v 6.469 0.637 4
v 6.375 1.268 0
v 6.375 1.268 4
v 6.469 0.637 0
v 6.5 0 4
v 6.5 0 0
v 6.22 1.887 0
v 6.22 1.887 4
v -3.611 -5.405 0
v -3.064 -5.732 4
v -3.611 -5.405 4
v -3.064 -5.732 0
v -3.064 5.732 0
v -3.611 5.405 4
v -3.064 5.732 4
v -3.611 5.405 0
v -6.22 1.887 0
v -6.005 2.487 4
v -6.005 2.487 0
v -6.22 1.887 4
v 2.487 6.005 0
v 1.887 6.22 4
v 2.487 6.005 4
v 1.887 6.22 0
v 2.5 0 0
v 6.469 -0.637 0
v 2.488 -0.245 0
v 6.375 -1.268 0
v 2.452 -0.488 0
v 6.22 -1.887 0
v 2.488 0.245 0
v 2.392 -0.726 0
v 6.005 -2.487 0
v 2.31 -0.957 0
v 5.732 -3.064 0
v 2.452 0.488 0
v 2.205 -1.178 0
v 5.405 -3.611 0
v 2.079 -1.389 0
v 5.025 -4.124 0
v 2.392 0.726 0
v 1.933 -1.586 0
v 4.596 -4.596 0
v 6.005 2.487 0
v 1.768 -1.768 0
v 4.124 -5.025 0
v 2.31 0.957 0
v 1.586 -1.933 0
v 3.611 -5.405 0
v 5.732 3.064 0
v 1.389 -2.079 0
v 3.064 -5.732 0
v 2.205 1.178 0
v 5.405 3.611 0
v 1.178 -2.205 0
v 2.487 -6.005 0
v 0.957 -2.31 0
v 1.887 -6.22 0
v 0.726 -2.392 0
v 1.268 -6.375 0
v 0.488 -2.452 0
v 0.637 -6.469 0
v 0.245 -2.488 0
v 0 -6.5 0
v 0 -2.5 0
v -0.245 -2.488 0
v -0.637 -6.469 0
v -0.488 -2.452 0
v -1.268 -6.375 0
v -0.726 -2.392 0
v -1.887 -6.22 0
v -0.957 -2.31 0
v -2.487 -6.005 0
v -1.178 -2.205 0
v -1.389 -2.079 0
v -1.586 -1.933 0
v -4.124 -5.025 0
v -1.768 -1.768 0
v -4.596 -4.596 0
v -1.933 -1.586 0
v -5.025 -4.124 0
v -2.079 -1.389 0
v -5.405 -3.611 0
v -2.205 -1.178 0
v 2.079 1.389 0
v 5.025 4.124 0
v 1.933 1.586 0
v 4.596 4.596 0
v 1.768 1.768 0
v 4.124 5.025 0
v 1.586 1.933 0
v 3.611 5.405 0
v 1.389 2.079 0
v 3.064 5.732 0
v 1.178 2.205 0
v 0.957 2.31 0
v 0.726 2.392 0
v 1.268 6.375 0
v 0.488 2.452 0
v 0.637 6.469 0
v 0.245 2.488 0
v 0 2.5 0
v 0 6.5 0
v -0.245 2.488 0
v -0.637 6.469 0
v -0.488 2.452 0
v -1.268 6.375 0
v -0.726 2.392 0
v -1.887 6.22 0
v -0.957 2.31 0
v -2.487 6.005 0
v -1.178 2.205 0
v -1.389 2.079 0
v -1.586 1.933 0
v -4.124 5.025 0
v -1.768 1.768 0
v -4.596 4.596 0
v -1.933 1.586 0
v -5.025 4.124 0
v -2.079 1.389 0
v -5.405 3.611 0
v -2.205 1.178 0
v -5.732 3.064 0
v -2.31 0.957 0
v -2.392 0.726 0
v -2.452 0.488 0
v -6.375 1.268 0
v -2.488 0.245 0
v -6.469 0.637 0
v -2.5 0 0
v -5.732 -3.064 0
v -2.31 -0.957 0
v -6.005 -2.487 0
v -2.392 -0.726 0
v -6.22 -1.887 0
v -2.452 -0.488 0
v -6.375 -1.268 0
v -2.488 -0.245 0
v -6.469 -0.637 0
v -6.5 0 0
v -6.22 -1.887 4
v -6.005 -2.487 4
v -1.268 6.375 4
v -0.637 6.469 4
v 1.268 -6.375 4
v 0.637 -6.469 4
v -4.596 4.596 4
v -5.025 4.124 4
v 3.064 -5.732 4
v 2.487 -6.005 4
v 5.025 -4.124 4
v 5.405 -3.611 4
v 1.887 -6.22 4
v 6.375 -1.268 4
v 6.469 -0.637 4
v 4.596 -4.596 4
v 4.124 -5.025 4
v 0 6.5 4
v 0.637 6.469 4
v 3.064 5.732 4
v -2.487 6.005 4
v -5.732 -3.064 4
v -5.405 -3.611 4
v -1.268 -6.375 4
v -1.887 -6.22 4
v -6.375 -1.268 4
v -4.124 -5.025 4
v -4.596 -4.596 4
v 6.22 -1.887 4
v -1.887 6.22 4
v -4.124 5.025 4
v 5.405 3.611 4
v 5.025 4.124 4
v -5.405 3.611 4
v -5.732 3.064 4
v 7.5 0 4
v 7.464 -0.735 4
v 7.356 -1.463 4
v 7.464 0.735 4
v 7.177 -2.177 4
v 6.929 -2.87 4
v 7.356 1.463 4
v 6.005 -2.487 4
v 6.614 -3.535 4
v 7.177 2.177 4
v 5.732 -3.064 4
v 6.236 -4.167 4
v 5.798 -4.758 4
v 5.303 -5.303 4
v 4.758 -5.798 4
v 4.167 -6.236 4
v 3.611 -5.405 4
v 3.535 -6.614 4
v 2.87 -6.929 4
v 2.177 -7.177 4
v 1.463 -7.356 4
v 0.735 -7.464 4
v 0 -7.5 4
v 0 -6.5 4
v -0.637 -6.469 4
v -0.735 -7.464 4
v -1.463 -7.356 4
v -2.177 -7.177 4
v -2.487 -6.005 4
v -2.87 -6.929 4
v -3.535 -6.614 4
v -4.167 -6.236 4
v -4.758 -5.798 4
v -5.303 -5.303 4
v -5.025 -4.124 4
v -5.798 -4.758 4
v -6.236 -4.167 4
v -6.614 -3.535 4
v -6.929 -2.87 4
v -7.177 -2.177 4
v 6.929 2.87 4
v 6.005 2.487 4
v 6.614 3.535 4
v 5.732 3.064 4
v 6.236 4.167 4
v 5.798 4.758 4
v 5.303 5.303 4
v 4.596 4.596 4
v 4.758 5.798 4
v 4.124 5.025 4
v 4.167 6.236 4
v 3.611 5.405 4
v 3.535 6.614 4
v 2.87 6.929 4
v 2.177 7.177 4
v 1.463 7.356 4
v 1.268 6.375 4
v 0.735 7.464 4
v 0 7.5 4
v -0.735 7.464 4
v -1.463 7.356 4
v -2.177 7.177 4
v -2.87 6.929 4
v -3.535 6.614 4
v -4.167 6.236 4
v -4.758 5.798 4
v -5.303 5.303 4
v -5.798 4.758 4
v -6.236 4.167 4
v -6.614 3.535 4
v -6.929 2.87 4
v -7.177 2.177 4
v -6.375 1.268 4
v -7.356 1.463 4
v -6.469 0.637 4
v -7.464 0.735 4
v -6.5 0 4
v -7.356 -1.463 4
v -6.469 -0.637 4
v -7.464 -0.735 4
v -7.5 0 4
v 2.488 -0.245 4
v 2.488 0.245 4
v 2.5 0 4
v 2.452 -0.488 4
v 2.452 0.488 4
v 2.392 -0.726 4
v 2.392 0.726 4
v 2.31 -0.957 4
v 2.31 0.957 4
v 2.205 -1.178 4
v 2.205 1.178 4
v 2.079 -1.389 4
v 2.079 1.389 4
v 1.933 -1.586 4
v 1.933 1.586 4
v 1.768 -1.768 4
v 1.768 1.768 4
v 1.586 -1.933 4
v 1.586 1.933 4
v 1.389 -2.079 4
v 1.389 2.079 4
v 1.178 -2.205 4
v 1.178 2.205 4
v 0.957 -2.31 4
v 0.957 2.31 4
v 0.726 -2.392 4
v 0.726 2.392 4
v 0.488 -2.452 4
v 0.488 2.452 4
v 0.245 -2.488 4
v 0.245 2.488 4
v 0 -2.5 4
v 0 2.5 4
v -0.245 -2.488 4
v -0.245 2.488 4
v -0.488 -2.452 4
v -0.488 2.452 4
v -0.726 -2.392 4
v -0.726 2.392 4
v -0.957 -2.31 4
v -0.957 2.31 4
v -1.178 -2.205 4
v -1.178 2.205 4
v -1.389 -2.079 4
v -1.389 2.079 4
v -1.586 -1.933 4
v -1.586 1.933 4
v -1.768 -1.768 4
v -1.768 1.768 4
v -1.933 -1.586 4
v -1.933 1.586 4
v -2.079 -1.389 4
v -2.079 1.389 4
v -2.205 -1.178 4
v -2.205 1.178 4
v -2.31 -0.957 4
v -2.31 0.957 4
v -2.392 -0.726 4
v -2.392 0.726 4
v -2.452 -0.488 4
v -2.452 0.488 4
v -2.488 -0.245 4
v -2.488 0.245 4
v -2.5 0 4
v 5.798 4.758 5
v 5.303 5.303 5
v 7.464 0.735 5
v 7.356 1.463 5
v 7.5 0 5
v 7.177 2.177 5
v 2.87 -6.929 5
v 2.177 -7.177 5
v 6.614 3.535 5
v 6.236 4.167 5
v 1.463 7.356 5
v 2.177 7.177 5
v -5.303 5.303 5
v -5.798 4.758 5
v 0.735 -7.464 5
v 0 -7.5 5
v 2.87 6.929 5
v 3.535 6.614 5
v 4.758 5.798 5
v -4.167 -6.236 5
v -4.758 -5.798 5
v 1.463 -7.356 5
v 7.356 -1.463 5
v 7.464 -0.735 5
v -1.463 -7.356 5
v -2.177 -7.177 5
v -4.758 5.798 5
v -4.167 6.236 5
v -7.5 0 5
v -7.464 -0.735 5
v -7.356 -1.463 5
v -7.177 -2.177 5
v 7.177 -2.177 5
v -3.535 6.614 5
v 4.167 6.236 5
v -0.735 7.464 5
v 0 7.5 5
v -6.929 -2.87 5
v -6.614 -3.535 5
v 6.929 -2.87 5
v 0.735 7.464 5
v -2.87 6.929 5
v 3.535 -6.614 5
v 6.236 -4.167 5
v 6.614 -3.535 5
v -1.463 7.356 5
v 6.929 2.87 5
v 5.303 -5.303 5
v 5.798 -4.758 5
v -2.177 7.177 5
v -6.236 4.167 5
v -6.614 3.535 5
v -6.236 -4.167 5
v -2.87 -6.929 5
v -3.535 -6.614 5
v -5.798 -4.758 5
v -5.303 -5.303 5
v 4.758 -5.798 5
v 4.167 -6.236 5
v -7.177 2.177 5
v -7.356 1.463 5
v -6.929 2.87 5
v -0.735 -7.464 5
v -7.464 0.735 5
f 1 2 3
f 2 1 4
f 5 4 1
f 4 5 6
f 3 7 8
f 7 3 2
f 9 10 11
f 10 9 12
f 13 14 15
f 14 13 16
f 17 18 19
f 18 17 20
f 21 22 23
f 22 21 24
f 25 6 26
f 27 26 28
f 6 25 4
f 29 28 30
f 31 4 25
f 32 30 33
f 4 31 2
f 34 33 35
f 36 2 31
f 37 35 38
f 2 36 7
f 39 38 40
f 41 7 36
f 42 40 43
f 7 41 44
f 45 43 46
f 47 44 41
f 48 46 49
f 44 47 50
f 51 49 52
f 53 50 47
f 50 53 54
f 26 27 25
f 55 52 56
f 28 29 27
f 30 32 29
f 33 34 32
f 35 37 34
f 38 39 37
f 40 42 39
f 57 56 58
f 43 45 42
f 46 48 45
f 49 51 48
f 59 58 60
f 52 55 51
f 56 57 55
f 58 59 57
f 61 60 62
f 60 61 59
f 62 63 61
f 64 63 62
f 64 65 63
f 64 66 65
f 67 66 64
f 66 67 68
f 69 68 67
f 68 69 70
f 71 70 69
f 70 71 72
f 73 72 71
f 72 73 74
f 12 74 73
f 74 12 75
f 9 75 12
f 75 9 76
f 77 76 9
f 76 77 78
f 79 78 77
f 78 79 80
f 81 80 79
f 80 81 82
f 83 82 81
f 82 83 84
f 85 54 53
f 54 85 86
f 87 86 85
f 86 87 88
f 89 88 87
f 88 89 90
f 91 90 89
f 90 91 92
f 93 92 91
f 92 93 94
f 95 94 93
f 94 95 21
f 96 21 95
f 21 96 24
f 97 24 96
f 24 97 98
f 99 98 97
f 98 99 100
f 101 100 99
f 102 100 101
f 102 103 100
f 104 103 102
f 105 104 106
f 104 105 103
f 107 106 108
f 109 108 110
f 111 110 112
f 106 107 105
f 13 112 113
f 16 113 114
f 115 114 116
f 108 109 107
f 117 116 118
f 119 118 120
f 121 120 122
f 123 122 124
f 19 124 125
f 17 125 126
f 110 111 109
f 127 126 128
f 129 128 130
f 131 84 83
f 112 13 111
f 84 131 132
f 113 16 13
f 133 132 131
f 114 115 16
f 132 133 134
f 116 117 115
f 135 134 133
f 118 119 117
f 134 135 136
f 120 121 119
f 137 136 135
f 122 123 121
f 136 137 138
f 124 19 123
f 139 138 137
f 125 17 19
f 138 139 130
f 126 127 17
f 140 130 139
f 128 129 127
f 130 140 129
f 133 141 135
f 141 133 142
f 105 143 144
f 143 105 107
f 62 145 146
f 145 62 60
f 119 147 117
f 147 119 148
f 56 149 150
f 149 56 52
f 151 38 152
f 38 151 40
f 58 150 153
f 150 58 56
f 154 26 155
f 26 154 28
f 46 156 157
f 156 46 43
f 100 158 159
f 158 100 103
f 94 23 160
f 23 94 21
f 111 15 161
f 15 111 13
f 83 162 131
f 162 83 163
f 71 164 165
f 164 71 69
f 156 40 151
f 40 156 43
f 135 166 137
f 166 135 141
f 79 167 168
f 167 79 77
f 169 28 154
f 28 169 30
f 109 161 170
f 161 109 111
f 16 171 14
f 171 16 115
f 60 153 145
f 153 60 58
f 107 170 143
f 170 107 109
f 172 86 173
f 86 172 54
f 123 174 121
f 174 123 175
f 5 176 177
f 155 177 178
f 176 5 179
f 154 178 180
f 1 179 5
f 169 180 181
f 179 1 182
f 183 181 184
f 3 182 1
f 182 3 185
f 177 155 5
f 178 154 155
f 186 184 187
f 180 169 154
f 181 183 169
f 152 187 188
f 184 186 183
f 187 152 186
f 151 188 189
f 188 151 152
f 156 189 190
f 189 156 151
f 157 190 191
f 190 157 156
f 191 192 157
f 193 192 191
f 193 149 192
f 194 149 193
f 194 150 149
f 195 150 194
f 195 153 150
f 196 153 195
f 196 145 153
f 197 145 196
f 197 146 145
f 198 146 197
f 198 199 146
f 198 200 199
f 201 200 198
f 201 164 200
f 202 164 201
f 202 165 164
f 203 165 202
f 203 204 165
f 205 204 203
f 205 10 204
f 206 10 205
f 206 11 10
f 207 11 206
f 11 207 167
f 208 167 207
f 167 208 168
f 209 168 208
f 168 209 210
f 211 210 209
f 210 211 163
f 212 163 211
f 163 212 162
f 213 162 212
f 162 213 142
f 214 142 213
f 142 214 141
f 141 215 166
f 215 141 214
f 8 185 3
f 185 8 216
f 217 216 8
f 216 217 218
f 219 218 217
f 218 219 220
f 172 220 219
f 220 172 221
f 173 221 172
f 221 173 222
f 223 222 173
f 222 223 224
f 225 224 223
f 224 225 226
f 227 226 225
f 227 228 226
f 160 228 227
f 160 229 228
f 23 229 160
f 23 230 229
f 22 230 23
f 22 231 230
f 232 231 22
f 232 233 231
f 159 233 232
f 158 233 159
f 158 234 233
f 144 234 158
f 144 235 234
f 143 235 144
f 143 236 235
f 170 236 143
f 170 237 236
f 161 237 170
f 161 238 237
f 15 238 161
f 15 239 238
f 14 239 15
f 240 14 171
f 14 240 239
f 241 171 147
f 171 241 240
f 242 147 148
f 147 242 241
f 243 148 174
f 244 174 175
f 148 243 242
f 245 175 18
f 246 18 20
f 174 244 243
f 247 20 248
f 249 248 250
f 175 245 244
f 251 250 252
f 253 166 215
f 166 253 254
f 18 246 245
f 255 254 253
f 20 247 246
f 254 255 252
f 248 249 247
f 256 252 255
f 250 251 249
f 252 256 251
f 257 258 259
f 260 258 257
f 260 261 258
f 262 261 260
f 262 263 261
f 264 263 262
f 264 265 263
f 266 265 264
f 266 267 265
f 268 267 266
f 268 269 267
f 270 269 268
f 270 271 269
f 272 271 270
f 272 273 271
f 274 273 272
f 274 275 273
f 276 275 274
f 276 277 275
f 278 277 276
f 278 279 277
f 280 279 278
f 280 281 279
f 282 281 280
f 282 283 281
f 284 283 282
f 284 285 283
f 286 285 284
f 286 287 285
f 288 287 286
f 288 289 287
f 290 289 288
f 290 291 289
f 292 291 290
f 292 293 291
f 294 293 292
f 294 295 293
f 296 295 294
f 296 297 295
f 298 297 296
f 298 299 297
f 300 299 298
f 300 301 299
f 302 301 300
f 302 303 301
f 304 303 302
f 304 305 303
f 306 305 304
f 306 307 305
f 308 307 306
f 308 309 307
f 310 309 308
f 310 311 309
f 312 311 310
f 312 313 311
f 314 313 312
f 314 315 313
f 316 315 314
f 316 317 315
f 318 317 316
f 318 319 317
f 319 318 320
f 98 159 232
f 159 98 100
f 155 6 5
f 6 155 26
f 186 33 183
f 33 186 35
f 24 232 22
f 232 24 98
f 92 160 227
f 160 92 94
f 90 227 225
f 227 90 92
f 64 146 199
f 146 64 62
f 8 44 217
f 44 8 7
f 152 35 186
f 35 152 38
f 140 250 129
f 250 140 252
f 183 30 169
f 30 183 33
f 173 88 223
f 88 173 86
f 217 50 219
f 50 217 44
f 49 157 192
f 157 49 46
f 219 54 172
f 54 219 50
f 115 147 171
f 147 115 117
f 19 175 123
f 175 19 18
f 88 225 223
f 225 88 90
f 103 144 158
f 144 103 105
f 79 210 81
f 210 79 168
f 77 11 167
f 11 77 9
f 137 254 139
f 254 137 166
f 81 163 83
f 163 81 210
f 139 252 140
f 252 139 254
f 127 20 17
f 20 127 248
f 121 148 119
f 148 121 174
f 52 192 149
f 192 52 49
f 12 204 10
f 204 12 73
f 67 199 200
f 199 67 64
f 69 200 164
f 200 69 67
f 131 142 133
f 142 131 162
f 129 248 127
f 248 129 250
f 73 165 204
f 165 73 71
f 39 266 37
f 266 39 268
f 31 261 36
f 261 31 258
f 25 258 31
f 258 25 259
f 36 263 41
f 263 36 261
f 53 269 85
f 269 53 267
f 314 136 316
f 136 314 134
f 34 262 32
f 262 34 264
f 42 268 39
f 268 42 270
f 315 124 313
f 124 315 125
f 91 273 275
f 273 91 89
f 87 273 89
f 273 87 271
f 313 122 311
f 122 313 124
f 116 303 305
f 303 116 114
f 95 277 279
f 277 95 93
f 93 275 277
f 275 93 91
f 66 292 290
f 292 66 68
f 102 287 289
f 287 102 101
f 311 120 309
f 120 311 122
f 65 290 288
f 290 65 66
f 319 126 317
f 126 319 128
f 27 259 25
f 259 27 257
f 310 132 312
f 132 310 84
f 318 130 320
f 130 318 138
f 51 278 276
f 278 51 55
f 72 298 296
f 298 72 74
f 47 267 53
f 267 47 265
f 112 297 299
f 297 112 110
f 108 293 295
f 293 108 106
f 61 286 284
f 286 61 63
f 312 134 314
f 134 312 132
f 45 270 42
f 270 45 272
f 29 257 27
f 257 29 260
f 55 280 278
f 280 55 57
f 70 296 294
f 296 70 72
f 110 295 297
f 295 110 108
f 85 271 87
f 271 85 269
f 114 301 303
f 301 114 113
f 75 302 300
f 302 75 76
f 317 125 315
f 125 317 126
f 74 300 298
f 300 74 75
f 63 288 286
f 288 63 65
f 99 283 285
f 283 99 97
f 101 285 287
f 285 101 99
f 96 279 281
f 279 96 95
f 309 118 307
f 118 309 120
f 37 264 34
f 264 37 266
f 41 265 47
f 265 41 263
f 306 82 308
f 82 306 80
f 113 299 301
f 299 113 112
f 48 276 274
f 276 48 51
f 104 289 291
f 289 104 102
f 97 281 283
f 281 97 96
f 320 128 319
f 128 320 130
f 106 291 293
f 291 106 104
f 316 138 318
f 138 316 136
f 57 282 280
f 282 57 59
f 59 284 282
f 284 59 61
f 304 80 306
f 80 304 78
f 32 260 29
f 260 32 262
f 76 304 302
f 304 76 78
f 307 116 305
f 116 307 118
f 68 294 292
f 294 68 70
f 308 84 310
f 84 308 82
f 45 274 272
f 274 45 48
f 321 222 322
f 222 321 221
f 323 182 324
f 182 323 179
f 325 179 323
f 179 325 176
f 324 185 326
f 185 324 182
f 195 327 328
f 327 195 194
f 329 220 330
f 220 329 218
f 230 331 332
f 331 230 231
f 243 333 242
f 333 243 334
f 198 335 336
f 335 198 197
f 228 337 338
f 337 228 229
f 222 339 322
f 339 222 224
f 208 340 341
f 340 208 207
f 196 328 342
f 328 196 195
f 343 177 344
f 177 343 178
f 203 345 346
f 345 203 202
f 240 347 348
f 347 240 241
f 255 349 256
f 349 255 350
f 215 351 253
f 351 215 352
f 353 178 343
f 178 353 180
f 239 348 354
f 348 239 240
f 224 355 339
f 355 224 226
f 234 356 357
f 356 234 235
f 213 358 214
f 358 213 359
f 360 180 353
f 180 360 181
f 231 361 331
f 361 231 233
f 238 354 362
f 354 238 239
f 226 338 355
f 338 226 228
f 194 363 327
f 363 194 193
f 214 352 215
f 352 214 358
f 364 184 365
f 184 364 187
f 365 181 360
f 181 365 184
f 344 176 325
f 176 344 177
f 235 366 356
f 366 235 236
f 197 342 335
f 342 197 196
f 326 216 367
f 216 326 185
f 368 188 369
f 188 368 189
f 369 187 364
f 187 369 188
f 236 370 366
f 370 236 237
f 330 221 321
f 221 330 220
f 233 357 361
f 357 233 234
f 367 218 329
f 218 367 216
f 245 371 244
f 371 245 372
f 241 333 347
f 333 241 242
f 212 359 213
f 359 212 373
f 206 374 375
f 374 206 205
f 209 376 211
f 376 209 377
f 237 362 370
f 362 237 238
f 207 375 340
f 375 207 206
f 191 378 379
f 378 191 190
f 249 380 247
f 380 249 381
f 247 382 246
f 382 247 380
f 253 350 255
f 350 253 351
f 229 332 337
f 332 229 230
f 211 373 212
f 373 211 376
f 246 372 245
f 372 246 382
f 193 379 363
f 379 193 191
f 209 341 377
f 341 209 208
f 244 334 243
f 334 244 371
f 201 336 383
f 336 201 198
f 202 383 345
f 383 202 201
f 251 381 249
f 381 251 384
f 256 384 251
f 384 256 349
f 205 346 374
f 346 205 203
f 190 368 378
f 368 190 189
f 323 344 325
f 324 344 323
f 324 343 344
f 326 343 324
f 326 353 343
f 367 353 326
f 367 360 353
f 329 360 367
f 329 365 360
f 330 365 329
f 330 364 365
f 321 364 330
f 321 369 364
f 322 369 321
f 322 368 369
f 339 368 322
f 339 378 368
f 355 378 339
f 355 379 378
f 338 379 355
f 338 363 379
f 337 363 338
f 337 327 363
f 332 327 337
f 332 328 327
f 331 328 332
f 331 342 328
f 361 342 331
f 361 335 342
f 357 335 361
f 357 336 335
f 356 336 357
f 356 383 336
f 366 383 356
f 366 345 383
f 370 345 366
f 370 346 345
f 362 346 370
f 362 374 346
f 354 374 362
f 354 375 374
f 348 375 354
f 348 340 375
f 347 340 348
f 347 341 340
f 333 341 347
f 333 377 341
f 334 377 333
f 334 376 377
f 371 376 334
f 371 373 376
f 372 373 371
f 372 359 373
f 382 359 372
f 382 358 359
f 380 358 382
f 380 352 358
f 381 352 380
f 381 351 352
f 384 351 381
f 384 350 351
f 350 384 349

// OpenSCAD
module flanged_ball_bearing() {
    difference() {
        // Outer cylinder of the bearing
        cylinder(h=4.0, d=13.0, $fn=64);
        
        // Inner bore
        translate([0, 0, -1])
            cylinder(h=6.0, d=5.0, $fn=64);
    }
    
    // Flange
    translate([0, 0, 4.0])
        cylinder(h=1.0, d=15.0, $fn=64);
}

flanged_ball_bearing();
